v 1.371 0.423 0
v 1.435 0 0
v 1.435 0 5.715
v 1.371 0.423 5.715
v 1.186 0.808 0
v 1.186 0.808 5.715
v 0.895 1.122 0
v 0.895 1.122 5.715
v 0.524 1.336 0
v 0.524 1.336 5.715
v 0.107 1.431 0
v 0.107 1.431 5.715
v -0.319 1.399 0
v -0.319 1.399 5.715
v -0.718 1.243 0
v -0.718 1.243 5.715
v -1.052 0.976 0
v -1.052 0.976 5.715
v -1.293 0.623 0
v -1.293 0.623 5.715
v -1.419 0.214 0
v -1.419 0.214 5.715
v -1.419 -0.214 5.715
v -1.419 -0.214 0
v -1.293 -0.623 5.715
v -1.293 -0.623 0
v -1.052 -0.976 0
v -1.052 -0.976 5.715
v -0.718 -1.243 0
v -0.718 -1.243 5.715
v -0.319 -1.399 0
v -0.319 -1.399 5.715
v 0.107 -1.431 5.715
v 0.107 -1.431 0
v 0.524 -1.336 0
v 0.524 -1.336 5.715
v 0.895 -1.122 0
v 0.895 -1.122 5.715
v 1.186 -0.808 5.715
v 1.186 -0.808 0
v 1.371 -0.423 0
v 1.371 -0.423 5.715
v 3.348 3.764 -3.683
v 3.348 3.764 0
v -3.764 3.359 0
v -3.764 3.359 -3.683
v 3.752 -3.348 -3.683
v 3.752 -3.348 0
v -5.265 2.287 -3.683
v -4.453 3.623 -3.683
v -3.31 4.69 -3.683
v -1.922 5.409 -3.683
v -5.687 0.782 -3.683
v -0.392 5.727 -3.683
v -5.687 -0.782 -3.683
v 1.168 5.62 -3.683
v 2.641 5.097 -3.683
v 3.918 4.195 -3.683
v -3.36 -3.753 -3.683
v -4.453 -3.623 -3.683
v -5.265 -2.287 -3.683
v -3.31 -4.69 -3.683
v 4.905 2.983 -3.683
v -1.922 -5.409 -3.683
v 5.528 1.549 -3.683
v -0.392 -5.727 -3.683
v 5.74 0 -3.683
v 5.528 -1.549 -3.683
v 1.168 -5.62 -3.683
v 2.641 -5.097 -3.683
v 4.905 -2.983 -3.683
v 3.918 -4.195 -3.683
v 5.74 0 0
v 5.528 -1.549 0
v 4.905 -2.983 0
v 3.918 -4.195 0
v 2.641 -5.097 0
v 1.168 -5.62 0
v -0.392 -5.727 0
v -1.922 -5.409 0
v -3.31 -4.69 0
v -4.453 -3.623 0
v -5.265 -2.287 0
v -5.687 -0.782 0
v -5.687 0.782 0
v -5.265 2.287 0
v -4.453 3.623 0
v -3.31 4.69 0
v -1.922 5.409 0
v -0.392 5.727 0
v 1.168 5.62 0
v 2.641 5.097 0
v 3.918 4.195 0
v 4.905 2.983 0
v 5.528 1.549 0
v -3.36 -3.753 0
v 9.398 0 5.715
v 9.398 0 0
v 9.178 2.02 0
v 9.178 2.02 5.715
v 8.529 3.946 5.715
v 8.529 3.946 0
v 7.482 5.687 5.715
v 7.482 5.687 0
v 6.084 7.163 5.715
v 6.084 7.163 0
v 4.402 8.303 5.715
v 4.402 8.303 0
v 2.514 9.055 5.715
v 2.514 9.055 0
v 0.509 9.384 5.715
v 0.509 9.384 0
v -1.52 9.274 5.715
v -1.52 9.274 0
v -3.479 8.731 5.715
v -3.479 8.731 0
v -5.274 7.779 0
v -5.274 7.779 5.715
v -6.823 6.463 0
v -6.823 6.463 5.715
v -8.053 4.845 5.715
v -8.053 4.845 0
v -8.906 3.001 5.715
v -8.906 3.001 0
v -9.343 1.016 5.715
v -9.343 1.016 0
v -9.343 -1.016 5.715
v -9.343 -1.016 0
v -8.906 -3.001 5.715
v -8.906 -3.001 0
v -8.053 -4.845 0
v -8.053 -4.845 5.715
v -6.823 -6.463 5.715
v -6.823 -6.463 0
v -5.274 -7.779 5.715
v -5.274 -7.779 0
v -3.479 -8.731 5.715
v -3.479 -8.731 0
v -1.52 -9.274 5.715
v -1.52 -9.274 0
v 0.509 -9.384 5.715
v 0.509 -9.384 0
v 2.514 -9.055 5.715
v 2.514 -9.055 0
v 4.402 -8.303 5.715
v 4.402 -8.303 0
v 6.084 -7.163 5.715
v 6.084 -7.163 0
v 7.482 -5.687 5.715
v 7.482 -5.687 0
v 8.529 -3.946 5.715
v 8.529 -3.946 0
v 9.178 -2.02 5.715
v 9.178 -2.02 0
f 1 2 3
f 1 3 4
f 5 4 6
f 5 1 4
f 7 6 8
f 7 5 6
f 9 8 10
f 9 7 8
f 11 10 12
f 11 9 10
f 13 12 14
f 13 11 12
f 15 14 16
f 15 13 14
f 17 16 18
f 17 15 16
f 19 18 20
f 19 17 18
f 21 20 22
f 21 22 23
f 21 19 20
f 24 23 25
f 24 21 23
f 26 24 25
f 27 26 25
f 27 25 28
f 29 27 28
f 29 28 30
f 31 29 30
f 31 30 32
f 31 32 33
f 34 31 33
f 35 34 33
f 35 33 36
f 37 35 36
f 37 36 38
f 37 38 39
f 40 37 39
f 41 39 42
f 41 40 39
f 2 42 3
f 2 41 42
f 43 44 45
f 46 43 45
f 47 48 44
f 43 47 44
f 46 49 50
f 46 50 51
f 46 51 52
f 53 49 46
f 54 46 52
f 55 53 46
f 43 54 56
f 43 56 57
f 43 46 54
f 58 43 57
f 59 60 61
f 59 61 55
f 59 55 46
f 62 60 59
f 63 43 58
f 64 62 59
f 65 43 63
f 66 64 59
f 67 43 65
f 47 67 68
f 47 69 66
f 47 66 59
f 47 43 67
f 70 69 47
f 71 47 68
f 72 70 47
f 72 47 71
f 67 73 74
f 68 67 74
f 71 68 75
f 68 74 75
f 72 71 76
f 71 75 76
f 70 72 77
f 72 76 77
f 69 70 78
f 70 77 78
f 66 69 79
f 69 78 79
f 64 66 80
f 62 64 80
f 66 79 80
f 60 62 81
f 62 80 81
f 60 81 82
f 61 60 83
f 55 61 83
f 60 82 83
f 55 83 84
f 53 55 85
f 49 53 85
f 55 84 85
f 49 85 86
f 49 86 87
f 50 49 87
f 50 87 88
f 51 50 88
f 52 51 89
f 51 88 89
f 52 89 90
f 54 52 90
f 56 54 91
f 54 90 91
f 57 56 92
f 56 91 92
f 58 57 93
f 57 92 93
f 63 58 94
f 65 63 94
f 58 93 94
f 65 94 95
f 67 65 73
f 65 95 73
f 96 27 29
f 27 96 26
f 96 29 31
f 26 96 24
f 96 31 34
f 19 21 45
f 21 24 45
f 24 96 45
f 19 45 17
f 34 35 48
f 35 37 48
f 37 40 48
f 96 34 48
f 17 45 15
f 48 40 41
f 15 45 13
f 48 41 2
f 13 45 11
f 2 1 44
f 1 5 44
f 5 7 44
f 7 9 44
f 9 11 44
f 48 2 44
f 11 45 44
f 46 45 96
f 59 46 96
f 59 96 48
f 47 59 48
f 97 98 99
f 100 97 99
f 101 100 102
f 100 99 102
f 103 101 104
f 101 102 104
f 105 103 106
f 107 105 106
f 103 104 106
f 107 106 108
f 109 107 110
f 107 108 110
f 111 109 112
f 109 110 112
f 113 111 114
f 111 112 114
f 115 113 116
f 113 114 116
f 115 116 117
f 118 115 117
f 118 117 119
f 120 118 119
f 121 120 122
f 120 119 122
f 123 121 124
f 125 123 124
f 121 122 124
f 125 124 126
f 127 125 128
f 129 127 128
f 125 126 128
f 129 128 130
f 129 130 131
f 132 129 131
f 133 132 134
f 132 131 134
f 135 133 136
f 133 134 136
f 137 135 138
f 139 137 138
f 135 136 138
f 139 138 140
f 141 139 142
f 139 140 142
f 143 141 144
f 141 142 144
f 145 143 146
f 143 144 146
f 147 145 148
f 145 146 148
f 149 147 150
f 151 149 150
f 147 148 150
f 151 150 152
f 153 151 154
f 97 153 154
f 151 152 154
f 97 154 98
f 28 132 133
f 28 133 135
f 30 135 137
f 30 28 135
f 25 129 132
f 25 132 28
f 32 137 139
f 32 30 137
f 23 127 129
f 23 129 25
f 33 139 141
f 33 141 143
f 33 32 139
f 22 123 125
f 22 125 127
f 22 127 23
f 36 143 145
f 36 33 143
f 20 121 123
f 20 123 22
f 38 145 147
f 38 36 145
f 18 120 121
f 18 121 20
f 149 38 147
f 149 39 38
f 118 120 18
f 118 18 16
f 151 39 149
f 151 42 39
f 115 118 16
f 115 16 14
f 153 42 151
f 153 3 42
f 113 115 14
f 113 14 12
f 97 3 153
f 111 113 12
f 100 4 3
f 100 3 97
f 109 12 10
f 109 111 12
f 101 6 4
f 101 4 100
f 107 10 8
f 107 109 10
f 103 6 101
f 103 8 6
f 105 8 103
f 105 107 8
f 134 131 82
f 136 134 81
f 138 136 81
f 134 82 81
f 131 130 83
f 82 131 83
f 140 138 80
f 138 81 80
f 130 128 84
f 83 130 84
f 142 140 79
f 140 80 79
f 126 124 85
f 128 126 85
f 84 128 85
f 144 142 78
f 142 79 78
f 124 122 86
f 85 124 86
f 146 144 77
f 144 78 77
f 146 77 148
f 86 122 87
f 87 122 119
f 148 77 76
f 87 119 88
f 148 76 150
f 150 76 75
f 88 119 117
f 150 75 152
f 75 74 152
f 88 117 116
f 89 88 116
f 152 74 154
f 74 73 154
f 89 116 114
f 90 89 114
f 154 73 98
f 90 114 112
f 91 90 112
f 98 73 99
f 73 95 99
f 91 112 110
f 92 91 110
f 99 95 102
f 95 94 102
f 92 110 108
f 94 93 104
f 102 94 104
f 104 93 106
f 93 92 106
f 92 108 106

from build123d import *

# Parameters (mm, degrees)
SKETCH1_R           = 9.398
SKETCH1_R_2         = 1.4351
BOSS_EXTRUDE1_DEPTH = 5.715
SKETCH2_R           = 5.7404
BOSS_EXTRUDE2_DEPTH = 3.683


with BuildPart() as part:
    # Sketch1 → Boss-Extrude1 (new body)
    with BuildSketch(Plane.XY):
        Circle(SKETCH1_R)
        Circle(SKETCH1_R_2, mode=Mode.SUBTRACT)
    extrude(amount=BOSS_EXTRUDE1_DEPTH)

    # Sketch2 → Boss-Extrude2 (add)
    with BuildSketch(Plane(origin=(0, 0, 0), x_dir=(-1, 0, 0), z_dir=(0, 0, -1))):
        with Locations(Location((0, 0, 0), (0, 0, 180))):
            Circle(SKETCH2_R)
        Polygon((3.764397664, 3.359086542), (3.359739968, -3.752913458), (-3.752260032, -3.348255763), (-3.347602336, 3.763744237), align=None, mode=Mode.SUBTRACT)
    extrude(amount=BOSS_EXTRUDE2_DEPTH)


solid = part.part
